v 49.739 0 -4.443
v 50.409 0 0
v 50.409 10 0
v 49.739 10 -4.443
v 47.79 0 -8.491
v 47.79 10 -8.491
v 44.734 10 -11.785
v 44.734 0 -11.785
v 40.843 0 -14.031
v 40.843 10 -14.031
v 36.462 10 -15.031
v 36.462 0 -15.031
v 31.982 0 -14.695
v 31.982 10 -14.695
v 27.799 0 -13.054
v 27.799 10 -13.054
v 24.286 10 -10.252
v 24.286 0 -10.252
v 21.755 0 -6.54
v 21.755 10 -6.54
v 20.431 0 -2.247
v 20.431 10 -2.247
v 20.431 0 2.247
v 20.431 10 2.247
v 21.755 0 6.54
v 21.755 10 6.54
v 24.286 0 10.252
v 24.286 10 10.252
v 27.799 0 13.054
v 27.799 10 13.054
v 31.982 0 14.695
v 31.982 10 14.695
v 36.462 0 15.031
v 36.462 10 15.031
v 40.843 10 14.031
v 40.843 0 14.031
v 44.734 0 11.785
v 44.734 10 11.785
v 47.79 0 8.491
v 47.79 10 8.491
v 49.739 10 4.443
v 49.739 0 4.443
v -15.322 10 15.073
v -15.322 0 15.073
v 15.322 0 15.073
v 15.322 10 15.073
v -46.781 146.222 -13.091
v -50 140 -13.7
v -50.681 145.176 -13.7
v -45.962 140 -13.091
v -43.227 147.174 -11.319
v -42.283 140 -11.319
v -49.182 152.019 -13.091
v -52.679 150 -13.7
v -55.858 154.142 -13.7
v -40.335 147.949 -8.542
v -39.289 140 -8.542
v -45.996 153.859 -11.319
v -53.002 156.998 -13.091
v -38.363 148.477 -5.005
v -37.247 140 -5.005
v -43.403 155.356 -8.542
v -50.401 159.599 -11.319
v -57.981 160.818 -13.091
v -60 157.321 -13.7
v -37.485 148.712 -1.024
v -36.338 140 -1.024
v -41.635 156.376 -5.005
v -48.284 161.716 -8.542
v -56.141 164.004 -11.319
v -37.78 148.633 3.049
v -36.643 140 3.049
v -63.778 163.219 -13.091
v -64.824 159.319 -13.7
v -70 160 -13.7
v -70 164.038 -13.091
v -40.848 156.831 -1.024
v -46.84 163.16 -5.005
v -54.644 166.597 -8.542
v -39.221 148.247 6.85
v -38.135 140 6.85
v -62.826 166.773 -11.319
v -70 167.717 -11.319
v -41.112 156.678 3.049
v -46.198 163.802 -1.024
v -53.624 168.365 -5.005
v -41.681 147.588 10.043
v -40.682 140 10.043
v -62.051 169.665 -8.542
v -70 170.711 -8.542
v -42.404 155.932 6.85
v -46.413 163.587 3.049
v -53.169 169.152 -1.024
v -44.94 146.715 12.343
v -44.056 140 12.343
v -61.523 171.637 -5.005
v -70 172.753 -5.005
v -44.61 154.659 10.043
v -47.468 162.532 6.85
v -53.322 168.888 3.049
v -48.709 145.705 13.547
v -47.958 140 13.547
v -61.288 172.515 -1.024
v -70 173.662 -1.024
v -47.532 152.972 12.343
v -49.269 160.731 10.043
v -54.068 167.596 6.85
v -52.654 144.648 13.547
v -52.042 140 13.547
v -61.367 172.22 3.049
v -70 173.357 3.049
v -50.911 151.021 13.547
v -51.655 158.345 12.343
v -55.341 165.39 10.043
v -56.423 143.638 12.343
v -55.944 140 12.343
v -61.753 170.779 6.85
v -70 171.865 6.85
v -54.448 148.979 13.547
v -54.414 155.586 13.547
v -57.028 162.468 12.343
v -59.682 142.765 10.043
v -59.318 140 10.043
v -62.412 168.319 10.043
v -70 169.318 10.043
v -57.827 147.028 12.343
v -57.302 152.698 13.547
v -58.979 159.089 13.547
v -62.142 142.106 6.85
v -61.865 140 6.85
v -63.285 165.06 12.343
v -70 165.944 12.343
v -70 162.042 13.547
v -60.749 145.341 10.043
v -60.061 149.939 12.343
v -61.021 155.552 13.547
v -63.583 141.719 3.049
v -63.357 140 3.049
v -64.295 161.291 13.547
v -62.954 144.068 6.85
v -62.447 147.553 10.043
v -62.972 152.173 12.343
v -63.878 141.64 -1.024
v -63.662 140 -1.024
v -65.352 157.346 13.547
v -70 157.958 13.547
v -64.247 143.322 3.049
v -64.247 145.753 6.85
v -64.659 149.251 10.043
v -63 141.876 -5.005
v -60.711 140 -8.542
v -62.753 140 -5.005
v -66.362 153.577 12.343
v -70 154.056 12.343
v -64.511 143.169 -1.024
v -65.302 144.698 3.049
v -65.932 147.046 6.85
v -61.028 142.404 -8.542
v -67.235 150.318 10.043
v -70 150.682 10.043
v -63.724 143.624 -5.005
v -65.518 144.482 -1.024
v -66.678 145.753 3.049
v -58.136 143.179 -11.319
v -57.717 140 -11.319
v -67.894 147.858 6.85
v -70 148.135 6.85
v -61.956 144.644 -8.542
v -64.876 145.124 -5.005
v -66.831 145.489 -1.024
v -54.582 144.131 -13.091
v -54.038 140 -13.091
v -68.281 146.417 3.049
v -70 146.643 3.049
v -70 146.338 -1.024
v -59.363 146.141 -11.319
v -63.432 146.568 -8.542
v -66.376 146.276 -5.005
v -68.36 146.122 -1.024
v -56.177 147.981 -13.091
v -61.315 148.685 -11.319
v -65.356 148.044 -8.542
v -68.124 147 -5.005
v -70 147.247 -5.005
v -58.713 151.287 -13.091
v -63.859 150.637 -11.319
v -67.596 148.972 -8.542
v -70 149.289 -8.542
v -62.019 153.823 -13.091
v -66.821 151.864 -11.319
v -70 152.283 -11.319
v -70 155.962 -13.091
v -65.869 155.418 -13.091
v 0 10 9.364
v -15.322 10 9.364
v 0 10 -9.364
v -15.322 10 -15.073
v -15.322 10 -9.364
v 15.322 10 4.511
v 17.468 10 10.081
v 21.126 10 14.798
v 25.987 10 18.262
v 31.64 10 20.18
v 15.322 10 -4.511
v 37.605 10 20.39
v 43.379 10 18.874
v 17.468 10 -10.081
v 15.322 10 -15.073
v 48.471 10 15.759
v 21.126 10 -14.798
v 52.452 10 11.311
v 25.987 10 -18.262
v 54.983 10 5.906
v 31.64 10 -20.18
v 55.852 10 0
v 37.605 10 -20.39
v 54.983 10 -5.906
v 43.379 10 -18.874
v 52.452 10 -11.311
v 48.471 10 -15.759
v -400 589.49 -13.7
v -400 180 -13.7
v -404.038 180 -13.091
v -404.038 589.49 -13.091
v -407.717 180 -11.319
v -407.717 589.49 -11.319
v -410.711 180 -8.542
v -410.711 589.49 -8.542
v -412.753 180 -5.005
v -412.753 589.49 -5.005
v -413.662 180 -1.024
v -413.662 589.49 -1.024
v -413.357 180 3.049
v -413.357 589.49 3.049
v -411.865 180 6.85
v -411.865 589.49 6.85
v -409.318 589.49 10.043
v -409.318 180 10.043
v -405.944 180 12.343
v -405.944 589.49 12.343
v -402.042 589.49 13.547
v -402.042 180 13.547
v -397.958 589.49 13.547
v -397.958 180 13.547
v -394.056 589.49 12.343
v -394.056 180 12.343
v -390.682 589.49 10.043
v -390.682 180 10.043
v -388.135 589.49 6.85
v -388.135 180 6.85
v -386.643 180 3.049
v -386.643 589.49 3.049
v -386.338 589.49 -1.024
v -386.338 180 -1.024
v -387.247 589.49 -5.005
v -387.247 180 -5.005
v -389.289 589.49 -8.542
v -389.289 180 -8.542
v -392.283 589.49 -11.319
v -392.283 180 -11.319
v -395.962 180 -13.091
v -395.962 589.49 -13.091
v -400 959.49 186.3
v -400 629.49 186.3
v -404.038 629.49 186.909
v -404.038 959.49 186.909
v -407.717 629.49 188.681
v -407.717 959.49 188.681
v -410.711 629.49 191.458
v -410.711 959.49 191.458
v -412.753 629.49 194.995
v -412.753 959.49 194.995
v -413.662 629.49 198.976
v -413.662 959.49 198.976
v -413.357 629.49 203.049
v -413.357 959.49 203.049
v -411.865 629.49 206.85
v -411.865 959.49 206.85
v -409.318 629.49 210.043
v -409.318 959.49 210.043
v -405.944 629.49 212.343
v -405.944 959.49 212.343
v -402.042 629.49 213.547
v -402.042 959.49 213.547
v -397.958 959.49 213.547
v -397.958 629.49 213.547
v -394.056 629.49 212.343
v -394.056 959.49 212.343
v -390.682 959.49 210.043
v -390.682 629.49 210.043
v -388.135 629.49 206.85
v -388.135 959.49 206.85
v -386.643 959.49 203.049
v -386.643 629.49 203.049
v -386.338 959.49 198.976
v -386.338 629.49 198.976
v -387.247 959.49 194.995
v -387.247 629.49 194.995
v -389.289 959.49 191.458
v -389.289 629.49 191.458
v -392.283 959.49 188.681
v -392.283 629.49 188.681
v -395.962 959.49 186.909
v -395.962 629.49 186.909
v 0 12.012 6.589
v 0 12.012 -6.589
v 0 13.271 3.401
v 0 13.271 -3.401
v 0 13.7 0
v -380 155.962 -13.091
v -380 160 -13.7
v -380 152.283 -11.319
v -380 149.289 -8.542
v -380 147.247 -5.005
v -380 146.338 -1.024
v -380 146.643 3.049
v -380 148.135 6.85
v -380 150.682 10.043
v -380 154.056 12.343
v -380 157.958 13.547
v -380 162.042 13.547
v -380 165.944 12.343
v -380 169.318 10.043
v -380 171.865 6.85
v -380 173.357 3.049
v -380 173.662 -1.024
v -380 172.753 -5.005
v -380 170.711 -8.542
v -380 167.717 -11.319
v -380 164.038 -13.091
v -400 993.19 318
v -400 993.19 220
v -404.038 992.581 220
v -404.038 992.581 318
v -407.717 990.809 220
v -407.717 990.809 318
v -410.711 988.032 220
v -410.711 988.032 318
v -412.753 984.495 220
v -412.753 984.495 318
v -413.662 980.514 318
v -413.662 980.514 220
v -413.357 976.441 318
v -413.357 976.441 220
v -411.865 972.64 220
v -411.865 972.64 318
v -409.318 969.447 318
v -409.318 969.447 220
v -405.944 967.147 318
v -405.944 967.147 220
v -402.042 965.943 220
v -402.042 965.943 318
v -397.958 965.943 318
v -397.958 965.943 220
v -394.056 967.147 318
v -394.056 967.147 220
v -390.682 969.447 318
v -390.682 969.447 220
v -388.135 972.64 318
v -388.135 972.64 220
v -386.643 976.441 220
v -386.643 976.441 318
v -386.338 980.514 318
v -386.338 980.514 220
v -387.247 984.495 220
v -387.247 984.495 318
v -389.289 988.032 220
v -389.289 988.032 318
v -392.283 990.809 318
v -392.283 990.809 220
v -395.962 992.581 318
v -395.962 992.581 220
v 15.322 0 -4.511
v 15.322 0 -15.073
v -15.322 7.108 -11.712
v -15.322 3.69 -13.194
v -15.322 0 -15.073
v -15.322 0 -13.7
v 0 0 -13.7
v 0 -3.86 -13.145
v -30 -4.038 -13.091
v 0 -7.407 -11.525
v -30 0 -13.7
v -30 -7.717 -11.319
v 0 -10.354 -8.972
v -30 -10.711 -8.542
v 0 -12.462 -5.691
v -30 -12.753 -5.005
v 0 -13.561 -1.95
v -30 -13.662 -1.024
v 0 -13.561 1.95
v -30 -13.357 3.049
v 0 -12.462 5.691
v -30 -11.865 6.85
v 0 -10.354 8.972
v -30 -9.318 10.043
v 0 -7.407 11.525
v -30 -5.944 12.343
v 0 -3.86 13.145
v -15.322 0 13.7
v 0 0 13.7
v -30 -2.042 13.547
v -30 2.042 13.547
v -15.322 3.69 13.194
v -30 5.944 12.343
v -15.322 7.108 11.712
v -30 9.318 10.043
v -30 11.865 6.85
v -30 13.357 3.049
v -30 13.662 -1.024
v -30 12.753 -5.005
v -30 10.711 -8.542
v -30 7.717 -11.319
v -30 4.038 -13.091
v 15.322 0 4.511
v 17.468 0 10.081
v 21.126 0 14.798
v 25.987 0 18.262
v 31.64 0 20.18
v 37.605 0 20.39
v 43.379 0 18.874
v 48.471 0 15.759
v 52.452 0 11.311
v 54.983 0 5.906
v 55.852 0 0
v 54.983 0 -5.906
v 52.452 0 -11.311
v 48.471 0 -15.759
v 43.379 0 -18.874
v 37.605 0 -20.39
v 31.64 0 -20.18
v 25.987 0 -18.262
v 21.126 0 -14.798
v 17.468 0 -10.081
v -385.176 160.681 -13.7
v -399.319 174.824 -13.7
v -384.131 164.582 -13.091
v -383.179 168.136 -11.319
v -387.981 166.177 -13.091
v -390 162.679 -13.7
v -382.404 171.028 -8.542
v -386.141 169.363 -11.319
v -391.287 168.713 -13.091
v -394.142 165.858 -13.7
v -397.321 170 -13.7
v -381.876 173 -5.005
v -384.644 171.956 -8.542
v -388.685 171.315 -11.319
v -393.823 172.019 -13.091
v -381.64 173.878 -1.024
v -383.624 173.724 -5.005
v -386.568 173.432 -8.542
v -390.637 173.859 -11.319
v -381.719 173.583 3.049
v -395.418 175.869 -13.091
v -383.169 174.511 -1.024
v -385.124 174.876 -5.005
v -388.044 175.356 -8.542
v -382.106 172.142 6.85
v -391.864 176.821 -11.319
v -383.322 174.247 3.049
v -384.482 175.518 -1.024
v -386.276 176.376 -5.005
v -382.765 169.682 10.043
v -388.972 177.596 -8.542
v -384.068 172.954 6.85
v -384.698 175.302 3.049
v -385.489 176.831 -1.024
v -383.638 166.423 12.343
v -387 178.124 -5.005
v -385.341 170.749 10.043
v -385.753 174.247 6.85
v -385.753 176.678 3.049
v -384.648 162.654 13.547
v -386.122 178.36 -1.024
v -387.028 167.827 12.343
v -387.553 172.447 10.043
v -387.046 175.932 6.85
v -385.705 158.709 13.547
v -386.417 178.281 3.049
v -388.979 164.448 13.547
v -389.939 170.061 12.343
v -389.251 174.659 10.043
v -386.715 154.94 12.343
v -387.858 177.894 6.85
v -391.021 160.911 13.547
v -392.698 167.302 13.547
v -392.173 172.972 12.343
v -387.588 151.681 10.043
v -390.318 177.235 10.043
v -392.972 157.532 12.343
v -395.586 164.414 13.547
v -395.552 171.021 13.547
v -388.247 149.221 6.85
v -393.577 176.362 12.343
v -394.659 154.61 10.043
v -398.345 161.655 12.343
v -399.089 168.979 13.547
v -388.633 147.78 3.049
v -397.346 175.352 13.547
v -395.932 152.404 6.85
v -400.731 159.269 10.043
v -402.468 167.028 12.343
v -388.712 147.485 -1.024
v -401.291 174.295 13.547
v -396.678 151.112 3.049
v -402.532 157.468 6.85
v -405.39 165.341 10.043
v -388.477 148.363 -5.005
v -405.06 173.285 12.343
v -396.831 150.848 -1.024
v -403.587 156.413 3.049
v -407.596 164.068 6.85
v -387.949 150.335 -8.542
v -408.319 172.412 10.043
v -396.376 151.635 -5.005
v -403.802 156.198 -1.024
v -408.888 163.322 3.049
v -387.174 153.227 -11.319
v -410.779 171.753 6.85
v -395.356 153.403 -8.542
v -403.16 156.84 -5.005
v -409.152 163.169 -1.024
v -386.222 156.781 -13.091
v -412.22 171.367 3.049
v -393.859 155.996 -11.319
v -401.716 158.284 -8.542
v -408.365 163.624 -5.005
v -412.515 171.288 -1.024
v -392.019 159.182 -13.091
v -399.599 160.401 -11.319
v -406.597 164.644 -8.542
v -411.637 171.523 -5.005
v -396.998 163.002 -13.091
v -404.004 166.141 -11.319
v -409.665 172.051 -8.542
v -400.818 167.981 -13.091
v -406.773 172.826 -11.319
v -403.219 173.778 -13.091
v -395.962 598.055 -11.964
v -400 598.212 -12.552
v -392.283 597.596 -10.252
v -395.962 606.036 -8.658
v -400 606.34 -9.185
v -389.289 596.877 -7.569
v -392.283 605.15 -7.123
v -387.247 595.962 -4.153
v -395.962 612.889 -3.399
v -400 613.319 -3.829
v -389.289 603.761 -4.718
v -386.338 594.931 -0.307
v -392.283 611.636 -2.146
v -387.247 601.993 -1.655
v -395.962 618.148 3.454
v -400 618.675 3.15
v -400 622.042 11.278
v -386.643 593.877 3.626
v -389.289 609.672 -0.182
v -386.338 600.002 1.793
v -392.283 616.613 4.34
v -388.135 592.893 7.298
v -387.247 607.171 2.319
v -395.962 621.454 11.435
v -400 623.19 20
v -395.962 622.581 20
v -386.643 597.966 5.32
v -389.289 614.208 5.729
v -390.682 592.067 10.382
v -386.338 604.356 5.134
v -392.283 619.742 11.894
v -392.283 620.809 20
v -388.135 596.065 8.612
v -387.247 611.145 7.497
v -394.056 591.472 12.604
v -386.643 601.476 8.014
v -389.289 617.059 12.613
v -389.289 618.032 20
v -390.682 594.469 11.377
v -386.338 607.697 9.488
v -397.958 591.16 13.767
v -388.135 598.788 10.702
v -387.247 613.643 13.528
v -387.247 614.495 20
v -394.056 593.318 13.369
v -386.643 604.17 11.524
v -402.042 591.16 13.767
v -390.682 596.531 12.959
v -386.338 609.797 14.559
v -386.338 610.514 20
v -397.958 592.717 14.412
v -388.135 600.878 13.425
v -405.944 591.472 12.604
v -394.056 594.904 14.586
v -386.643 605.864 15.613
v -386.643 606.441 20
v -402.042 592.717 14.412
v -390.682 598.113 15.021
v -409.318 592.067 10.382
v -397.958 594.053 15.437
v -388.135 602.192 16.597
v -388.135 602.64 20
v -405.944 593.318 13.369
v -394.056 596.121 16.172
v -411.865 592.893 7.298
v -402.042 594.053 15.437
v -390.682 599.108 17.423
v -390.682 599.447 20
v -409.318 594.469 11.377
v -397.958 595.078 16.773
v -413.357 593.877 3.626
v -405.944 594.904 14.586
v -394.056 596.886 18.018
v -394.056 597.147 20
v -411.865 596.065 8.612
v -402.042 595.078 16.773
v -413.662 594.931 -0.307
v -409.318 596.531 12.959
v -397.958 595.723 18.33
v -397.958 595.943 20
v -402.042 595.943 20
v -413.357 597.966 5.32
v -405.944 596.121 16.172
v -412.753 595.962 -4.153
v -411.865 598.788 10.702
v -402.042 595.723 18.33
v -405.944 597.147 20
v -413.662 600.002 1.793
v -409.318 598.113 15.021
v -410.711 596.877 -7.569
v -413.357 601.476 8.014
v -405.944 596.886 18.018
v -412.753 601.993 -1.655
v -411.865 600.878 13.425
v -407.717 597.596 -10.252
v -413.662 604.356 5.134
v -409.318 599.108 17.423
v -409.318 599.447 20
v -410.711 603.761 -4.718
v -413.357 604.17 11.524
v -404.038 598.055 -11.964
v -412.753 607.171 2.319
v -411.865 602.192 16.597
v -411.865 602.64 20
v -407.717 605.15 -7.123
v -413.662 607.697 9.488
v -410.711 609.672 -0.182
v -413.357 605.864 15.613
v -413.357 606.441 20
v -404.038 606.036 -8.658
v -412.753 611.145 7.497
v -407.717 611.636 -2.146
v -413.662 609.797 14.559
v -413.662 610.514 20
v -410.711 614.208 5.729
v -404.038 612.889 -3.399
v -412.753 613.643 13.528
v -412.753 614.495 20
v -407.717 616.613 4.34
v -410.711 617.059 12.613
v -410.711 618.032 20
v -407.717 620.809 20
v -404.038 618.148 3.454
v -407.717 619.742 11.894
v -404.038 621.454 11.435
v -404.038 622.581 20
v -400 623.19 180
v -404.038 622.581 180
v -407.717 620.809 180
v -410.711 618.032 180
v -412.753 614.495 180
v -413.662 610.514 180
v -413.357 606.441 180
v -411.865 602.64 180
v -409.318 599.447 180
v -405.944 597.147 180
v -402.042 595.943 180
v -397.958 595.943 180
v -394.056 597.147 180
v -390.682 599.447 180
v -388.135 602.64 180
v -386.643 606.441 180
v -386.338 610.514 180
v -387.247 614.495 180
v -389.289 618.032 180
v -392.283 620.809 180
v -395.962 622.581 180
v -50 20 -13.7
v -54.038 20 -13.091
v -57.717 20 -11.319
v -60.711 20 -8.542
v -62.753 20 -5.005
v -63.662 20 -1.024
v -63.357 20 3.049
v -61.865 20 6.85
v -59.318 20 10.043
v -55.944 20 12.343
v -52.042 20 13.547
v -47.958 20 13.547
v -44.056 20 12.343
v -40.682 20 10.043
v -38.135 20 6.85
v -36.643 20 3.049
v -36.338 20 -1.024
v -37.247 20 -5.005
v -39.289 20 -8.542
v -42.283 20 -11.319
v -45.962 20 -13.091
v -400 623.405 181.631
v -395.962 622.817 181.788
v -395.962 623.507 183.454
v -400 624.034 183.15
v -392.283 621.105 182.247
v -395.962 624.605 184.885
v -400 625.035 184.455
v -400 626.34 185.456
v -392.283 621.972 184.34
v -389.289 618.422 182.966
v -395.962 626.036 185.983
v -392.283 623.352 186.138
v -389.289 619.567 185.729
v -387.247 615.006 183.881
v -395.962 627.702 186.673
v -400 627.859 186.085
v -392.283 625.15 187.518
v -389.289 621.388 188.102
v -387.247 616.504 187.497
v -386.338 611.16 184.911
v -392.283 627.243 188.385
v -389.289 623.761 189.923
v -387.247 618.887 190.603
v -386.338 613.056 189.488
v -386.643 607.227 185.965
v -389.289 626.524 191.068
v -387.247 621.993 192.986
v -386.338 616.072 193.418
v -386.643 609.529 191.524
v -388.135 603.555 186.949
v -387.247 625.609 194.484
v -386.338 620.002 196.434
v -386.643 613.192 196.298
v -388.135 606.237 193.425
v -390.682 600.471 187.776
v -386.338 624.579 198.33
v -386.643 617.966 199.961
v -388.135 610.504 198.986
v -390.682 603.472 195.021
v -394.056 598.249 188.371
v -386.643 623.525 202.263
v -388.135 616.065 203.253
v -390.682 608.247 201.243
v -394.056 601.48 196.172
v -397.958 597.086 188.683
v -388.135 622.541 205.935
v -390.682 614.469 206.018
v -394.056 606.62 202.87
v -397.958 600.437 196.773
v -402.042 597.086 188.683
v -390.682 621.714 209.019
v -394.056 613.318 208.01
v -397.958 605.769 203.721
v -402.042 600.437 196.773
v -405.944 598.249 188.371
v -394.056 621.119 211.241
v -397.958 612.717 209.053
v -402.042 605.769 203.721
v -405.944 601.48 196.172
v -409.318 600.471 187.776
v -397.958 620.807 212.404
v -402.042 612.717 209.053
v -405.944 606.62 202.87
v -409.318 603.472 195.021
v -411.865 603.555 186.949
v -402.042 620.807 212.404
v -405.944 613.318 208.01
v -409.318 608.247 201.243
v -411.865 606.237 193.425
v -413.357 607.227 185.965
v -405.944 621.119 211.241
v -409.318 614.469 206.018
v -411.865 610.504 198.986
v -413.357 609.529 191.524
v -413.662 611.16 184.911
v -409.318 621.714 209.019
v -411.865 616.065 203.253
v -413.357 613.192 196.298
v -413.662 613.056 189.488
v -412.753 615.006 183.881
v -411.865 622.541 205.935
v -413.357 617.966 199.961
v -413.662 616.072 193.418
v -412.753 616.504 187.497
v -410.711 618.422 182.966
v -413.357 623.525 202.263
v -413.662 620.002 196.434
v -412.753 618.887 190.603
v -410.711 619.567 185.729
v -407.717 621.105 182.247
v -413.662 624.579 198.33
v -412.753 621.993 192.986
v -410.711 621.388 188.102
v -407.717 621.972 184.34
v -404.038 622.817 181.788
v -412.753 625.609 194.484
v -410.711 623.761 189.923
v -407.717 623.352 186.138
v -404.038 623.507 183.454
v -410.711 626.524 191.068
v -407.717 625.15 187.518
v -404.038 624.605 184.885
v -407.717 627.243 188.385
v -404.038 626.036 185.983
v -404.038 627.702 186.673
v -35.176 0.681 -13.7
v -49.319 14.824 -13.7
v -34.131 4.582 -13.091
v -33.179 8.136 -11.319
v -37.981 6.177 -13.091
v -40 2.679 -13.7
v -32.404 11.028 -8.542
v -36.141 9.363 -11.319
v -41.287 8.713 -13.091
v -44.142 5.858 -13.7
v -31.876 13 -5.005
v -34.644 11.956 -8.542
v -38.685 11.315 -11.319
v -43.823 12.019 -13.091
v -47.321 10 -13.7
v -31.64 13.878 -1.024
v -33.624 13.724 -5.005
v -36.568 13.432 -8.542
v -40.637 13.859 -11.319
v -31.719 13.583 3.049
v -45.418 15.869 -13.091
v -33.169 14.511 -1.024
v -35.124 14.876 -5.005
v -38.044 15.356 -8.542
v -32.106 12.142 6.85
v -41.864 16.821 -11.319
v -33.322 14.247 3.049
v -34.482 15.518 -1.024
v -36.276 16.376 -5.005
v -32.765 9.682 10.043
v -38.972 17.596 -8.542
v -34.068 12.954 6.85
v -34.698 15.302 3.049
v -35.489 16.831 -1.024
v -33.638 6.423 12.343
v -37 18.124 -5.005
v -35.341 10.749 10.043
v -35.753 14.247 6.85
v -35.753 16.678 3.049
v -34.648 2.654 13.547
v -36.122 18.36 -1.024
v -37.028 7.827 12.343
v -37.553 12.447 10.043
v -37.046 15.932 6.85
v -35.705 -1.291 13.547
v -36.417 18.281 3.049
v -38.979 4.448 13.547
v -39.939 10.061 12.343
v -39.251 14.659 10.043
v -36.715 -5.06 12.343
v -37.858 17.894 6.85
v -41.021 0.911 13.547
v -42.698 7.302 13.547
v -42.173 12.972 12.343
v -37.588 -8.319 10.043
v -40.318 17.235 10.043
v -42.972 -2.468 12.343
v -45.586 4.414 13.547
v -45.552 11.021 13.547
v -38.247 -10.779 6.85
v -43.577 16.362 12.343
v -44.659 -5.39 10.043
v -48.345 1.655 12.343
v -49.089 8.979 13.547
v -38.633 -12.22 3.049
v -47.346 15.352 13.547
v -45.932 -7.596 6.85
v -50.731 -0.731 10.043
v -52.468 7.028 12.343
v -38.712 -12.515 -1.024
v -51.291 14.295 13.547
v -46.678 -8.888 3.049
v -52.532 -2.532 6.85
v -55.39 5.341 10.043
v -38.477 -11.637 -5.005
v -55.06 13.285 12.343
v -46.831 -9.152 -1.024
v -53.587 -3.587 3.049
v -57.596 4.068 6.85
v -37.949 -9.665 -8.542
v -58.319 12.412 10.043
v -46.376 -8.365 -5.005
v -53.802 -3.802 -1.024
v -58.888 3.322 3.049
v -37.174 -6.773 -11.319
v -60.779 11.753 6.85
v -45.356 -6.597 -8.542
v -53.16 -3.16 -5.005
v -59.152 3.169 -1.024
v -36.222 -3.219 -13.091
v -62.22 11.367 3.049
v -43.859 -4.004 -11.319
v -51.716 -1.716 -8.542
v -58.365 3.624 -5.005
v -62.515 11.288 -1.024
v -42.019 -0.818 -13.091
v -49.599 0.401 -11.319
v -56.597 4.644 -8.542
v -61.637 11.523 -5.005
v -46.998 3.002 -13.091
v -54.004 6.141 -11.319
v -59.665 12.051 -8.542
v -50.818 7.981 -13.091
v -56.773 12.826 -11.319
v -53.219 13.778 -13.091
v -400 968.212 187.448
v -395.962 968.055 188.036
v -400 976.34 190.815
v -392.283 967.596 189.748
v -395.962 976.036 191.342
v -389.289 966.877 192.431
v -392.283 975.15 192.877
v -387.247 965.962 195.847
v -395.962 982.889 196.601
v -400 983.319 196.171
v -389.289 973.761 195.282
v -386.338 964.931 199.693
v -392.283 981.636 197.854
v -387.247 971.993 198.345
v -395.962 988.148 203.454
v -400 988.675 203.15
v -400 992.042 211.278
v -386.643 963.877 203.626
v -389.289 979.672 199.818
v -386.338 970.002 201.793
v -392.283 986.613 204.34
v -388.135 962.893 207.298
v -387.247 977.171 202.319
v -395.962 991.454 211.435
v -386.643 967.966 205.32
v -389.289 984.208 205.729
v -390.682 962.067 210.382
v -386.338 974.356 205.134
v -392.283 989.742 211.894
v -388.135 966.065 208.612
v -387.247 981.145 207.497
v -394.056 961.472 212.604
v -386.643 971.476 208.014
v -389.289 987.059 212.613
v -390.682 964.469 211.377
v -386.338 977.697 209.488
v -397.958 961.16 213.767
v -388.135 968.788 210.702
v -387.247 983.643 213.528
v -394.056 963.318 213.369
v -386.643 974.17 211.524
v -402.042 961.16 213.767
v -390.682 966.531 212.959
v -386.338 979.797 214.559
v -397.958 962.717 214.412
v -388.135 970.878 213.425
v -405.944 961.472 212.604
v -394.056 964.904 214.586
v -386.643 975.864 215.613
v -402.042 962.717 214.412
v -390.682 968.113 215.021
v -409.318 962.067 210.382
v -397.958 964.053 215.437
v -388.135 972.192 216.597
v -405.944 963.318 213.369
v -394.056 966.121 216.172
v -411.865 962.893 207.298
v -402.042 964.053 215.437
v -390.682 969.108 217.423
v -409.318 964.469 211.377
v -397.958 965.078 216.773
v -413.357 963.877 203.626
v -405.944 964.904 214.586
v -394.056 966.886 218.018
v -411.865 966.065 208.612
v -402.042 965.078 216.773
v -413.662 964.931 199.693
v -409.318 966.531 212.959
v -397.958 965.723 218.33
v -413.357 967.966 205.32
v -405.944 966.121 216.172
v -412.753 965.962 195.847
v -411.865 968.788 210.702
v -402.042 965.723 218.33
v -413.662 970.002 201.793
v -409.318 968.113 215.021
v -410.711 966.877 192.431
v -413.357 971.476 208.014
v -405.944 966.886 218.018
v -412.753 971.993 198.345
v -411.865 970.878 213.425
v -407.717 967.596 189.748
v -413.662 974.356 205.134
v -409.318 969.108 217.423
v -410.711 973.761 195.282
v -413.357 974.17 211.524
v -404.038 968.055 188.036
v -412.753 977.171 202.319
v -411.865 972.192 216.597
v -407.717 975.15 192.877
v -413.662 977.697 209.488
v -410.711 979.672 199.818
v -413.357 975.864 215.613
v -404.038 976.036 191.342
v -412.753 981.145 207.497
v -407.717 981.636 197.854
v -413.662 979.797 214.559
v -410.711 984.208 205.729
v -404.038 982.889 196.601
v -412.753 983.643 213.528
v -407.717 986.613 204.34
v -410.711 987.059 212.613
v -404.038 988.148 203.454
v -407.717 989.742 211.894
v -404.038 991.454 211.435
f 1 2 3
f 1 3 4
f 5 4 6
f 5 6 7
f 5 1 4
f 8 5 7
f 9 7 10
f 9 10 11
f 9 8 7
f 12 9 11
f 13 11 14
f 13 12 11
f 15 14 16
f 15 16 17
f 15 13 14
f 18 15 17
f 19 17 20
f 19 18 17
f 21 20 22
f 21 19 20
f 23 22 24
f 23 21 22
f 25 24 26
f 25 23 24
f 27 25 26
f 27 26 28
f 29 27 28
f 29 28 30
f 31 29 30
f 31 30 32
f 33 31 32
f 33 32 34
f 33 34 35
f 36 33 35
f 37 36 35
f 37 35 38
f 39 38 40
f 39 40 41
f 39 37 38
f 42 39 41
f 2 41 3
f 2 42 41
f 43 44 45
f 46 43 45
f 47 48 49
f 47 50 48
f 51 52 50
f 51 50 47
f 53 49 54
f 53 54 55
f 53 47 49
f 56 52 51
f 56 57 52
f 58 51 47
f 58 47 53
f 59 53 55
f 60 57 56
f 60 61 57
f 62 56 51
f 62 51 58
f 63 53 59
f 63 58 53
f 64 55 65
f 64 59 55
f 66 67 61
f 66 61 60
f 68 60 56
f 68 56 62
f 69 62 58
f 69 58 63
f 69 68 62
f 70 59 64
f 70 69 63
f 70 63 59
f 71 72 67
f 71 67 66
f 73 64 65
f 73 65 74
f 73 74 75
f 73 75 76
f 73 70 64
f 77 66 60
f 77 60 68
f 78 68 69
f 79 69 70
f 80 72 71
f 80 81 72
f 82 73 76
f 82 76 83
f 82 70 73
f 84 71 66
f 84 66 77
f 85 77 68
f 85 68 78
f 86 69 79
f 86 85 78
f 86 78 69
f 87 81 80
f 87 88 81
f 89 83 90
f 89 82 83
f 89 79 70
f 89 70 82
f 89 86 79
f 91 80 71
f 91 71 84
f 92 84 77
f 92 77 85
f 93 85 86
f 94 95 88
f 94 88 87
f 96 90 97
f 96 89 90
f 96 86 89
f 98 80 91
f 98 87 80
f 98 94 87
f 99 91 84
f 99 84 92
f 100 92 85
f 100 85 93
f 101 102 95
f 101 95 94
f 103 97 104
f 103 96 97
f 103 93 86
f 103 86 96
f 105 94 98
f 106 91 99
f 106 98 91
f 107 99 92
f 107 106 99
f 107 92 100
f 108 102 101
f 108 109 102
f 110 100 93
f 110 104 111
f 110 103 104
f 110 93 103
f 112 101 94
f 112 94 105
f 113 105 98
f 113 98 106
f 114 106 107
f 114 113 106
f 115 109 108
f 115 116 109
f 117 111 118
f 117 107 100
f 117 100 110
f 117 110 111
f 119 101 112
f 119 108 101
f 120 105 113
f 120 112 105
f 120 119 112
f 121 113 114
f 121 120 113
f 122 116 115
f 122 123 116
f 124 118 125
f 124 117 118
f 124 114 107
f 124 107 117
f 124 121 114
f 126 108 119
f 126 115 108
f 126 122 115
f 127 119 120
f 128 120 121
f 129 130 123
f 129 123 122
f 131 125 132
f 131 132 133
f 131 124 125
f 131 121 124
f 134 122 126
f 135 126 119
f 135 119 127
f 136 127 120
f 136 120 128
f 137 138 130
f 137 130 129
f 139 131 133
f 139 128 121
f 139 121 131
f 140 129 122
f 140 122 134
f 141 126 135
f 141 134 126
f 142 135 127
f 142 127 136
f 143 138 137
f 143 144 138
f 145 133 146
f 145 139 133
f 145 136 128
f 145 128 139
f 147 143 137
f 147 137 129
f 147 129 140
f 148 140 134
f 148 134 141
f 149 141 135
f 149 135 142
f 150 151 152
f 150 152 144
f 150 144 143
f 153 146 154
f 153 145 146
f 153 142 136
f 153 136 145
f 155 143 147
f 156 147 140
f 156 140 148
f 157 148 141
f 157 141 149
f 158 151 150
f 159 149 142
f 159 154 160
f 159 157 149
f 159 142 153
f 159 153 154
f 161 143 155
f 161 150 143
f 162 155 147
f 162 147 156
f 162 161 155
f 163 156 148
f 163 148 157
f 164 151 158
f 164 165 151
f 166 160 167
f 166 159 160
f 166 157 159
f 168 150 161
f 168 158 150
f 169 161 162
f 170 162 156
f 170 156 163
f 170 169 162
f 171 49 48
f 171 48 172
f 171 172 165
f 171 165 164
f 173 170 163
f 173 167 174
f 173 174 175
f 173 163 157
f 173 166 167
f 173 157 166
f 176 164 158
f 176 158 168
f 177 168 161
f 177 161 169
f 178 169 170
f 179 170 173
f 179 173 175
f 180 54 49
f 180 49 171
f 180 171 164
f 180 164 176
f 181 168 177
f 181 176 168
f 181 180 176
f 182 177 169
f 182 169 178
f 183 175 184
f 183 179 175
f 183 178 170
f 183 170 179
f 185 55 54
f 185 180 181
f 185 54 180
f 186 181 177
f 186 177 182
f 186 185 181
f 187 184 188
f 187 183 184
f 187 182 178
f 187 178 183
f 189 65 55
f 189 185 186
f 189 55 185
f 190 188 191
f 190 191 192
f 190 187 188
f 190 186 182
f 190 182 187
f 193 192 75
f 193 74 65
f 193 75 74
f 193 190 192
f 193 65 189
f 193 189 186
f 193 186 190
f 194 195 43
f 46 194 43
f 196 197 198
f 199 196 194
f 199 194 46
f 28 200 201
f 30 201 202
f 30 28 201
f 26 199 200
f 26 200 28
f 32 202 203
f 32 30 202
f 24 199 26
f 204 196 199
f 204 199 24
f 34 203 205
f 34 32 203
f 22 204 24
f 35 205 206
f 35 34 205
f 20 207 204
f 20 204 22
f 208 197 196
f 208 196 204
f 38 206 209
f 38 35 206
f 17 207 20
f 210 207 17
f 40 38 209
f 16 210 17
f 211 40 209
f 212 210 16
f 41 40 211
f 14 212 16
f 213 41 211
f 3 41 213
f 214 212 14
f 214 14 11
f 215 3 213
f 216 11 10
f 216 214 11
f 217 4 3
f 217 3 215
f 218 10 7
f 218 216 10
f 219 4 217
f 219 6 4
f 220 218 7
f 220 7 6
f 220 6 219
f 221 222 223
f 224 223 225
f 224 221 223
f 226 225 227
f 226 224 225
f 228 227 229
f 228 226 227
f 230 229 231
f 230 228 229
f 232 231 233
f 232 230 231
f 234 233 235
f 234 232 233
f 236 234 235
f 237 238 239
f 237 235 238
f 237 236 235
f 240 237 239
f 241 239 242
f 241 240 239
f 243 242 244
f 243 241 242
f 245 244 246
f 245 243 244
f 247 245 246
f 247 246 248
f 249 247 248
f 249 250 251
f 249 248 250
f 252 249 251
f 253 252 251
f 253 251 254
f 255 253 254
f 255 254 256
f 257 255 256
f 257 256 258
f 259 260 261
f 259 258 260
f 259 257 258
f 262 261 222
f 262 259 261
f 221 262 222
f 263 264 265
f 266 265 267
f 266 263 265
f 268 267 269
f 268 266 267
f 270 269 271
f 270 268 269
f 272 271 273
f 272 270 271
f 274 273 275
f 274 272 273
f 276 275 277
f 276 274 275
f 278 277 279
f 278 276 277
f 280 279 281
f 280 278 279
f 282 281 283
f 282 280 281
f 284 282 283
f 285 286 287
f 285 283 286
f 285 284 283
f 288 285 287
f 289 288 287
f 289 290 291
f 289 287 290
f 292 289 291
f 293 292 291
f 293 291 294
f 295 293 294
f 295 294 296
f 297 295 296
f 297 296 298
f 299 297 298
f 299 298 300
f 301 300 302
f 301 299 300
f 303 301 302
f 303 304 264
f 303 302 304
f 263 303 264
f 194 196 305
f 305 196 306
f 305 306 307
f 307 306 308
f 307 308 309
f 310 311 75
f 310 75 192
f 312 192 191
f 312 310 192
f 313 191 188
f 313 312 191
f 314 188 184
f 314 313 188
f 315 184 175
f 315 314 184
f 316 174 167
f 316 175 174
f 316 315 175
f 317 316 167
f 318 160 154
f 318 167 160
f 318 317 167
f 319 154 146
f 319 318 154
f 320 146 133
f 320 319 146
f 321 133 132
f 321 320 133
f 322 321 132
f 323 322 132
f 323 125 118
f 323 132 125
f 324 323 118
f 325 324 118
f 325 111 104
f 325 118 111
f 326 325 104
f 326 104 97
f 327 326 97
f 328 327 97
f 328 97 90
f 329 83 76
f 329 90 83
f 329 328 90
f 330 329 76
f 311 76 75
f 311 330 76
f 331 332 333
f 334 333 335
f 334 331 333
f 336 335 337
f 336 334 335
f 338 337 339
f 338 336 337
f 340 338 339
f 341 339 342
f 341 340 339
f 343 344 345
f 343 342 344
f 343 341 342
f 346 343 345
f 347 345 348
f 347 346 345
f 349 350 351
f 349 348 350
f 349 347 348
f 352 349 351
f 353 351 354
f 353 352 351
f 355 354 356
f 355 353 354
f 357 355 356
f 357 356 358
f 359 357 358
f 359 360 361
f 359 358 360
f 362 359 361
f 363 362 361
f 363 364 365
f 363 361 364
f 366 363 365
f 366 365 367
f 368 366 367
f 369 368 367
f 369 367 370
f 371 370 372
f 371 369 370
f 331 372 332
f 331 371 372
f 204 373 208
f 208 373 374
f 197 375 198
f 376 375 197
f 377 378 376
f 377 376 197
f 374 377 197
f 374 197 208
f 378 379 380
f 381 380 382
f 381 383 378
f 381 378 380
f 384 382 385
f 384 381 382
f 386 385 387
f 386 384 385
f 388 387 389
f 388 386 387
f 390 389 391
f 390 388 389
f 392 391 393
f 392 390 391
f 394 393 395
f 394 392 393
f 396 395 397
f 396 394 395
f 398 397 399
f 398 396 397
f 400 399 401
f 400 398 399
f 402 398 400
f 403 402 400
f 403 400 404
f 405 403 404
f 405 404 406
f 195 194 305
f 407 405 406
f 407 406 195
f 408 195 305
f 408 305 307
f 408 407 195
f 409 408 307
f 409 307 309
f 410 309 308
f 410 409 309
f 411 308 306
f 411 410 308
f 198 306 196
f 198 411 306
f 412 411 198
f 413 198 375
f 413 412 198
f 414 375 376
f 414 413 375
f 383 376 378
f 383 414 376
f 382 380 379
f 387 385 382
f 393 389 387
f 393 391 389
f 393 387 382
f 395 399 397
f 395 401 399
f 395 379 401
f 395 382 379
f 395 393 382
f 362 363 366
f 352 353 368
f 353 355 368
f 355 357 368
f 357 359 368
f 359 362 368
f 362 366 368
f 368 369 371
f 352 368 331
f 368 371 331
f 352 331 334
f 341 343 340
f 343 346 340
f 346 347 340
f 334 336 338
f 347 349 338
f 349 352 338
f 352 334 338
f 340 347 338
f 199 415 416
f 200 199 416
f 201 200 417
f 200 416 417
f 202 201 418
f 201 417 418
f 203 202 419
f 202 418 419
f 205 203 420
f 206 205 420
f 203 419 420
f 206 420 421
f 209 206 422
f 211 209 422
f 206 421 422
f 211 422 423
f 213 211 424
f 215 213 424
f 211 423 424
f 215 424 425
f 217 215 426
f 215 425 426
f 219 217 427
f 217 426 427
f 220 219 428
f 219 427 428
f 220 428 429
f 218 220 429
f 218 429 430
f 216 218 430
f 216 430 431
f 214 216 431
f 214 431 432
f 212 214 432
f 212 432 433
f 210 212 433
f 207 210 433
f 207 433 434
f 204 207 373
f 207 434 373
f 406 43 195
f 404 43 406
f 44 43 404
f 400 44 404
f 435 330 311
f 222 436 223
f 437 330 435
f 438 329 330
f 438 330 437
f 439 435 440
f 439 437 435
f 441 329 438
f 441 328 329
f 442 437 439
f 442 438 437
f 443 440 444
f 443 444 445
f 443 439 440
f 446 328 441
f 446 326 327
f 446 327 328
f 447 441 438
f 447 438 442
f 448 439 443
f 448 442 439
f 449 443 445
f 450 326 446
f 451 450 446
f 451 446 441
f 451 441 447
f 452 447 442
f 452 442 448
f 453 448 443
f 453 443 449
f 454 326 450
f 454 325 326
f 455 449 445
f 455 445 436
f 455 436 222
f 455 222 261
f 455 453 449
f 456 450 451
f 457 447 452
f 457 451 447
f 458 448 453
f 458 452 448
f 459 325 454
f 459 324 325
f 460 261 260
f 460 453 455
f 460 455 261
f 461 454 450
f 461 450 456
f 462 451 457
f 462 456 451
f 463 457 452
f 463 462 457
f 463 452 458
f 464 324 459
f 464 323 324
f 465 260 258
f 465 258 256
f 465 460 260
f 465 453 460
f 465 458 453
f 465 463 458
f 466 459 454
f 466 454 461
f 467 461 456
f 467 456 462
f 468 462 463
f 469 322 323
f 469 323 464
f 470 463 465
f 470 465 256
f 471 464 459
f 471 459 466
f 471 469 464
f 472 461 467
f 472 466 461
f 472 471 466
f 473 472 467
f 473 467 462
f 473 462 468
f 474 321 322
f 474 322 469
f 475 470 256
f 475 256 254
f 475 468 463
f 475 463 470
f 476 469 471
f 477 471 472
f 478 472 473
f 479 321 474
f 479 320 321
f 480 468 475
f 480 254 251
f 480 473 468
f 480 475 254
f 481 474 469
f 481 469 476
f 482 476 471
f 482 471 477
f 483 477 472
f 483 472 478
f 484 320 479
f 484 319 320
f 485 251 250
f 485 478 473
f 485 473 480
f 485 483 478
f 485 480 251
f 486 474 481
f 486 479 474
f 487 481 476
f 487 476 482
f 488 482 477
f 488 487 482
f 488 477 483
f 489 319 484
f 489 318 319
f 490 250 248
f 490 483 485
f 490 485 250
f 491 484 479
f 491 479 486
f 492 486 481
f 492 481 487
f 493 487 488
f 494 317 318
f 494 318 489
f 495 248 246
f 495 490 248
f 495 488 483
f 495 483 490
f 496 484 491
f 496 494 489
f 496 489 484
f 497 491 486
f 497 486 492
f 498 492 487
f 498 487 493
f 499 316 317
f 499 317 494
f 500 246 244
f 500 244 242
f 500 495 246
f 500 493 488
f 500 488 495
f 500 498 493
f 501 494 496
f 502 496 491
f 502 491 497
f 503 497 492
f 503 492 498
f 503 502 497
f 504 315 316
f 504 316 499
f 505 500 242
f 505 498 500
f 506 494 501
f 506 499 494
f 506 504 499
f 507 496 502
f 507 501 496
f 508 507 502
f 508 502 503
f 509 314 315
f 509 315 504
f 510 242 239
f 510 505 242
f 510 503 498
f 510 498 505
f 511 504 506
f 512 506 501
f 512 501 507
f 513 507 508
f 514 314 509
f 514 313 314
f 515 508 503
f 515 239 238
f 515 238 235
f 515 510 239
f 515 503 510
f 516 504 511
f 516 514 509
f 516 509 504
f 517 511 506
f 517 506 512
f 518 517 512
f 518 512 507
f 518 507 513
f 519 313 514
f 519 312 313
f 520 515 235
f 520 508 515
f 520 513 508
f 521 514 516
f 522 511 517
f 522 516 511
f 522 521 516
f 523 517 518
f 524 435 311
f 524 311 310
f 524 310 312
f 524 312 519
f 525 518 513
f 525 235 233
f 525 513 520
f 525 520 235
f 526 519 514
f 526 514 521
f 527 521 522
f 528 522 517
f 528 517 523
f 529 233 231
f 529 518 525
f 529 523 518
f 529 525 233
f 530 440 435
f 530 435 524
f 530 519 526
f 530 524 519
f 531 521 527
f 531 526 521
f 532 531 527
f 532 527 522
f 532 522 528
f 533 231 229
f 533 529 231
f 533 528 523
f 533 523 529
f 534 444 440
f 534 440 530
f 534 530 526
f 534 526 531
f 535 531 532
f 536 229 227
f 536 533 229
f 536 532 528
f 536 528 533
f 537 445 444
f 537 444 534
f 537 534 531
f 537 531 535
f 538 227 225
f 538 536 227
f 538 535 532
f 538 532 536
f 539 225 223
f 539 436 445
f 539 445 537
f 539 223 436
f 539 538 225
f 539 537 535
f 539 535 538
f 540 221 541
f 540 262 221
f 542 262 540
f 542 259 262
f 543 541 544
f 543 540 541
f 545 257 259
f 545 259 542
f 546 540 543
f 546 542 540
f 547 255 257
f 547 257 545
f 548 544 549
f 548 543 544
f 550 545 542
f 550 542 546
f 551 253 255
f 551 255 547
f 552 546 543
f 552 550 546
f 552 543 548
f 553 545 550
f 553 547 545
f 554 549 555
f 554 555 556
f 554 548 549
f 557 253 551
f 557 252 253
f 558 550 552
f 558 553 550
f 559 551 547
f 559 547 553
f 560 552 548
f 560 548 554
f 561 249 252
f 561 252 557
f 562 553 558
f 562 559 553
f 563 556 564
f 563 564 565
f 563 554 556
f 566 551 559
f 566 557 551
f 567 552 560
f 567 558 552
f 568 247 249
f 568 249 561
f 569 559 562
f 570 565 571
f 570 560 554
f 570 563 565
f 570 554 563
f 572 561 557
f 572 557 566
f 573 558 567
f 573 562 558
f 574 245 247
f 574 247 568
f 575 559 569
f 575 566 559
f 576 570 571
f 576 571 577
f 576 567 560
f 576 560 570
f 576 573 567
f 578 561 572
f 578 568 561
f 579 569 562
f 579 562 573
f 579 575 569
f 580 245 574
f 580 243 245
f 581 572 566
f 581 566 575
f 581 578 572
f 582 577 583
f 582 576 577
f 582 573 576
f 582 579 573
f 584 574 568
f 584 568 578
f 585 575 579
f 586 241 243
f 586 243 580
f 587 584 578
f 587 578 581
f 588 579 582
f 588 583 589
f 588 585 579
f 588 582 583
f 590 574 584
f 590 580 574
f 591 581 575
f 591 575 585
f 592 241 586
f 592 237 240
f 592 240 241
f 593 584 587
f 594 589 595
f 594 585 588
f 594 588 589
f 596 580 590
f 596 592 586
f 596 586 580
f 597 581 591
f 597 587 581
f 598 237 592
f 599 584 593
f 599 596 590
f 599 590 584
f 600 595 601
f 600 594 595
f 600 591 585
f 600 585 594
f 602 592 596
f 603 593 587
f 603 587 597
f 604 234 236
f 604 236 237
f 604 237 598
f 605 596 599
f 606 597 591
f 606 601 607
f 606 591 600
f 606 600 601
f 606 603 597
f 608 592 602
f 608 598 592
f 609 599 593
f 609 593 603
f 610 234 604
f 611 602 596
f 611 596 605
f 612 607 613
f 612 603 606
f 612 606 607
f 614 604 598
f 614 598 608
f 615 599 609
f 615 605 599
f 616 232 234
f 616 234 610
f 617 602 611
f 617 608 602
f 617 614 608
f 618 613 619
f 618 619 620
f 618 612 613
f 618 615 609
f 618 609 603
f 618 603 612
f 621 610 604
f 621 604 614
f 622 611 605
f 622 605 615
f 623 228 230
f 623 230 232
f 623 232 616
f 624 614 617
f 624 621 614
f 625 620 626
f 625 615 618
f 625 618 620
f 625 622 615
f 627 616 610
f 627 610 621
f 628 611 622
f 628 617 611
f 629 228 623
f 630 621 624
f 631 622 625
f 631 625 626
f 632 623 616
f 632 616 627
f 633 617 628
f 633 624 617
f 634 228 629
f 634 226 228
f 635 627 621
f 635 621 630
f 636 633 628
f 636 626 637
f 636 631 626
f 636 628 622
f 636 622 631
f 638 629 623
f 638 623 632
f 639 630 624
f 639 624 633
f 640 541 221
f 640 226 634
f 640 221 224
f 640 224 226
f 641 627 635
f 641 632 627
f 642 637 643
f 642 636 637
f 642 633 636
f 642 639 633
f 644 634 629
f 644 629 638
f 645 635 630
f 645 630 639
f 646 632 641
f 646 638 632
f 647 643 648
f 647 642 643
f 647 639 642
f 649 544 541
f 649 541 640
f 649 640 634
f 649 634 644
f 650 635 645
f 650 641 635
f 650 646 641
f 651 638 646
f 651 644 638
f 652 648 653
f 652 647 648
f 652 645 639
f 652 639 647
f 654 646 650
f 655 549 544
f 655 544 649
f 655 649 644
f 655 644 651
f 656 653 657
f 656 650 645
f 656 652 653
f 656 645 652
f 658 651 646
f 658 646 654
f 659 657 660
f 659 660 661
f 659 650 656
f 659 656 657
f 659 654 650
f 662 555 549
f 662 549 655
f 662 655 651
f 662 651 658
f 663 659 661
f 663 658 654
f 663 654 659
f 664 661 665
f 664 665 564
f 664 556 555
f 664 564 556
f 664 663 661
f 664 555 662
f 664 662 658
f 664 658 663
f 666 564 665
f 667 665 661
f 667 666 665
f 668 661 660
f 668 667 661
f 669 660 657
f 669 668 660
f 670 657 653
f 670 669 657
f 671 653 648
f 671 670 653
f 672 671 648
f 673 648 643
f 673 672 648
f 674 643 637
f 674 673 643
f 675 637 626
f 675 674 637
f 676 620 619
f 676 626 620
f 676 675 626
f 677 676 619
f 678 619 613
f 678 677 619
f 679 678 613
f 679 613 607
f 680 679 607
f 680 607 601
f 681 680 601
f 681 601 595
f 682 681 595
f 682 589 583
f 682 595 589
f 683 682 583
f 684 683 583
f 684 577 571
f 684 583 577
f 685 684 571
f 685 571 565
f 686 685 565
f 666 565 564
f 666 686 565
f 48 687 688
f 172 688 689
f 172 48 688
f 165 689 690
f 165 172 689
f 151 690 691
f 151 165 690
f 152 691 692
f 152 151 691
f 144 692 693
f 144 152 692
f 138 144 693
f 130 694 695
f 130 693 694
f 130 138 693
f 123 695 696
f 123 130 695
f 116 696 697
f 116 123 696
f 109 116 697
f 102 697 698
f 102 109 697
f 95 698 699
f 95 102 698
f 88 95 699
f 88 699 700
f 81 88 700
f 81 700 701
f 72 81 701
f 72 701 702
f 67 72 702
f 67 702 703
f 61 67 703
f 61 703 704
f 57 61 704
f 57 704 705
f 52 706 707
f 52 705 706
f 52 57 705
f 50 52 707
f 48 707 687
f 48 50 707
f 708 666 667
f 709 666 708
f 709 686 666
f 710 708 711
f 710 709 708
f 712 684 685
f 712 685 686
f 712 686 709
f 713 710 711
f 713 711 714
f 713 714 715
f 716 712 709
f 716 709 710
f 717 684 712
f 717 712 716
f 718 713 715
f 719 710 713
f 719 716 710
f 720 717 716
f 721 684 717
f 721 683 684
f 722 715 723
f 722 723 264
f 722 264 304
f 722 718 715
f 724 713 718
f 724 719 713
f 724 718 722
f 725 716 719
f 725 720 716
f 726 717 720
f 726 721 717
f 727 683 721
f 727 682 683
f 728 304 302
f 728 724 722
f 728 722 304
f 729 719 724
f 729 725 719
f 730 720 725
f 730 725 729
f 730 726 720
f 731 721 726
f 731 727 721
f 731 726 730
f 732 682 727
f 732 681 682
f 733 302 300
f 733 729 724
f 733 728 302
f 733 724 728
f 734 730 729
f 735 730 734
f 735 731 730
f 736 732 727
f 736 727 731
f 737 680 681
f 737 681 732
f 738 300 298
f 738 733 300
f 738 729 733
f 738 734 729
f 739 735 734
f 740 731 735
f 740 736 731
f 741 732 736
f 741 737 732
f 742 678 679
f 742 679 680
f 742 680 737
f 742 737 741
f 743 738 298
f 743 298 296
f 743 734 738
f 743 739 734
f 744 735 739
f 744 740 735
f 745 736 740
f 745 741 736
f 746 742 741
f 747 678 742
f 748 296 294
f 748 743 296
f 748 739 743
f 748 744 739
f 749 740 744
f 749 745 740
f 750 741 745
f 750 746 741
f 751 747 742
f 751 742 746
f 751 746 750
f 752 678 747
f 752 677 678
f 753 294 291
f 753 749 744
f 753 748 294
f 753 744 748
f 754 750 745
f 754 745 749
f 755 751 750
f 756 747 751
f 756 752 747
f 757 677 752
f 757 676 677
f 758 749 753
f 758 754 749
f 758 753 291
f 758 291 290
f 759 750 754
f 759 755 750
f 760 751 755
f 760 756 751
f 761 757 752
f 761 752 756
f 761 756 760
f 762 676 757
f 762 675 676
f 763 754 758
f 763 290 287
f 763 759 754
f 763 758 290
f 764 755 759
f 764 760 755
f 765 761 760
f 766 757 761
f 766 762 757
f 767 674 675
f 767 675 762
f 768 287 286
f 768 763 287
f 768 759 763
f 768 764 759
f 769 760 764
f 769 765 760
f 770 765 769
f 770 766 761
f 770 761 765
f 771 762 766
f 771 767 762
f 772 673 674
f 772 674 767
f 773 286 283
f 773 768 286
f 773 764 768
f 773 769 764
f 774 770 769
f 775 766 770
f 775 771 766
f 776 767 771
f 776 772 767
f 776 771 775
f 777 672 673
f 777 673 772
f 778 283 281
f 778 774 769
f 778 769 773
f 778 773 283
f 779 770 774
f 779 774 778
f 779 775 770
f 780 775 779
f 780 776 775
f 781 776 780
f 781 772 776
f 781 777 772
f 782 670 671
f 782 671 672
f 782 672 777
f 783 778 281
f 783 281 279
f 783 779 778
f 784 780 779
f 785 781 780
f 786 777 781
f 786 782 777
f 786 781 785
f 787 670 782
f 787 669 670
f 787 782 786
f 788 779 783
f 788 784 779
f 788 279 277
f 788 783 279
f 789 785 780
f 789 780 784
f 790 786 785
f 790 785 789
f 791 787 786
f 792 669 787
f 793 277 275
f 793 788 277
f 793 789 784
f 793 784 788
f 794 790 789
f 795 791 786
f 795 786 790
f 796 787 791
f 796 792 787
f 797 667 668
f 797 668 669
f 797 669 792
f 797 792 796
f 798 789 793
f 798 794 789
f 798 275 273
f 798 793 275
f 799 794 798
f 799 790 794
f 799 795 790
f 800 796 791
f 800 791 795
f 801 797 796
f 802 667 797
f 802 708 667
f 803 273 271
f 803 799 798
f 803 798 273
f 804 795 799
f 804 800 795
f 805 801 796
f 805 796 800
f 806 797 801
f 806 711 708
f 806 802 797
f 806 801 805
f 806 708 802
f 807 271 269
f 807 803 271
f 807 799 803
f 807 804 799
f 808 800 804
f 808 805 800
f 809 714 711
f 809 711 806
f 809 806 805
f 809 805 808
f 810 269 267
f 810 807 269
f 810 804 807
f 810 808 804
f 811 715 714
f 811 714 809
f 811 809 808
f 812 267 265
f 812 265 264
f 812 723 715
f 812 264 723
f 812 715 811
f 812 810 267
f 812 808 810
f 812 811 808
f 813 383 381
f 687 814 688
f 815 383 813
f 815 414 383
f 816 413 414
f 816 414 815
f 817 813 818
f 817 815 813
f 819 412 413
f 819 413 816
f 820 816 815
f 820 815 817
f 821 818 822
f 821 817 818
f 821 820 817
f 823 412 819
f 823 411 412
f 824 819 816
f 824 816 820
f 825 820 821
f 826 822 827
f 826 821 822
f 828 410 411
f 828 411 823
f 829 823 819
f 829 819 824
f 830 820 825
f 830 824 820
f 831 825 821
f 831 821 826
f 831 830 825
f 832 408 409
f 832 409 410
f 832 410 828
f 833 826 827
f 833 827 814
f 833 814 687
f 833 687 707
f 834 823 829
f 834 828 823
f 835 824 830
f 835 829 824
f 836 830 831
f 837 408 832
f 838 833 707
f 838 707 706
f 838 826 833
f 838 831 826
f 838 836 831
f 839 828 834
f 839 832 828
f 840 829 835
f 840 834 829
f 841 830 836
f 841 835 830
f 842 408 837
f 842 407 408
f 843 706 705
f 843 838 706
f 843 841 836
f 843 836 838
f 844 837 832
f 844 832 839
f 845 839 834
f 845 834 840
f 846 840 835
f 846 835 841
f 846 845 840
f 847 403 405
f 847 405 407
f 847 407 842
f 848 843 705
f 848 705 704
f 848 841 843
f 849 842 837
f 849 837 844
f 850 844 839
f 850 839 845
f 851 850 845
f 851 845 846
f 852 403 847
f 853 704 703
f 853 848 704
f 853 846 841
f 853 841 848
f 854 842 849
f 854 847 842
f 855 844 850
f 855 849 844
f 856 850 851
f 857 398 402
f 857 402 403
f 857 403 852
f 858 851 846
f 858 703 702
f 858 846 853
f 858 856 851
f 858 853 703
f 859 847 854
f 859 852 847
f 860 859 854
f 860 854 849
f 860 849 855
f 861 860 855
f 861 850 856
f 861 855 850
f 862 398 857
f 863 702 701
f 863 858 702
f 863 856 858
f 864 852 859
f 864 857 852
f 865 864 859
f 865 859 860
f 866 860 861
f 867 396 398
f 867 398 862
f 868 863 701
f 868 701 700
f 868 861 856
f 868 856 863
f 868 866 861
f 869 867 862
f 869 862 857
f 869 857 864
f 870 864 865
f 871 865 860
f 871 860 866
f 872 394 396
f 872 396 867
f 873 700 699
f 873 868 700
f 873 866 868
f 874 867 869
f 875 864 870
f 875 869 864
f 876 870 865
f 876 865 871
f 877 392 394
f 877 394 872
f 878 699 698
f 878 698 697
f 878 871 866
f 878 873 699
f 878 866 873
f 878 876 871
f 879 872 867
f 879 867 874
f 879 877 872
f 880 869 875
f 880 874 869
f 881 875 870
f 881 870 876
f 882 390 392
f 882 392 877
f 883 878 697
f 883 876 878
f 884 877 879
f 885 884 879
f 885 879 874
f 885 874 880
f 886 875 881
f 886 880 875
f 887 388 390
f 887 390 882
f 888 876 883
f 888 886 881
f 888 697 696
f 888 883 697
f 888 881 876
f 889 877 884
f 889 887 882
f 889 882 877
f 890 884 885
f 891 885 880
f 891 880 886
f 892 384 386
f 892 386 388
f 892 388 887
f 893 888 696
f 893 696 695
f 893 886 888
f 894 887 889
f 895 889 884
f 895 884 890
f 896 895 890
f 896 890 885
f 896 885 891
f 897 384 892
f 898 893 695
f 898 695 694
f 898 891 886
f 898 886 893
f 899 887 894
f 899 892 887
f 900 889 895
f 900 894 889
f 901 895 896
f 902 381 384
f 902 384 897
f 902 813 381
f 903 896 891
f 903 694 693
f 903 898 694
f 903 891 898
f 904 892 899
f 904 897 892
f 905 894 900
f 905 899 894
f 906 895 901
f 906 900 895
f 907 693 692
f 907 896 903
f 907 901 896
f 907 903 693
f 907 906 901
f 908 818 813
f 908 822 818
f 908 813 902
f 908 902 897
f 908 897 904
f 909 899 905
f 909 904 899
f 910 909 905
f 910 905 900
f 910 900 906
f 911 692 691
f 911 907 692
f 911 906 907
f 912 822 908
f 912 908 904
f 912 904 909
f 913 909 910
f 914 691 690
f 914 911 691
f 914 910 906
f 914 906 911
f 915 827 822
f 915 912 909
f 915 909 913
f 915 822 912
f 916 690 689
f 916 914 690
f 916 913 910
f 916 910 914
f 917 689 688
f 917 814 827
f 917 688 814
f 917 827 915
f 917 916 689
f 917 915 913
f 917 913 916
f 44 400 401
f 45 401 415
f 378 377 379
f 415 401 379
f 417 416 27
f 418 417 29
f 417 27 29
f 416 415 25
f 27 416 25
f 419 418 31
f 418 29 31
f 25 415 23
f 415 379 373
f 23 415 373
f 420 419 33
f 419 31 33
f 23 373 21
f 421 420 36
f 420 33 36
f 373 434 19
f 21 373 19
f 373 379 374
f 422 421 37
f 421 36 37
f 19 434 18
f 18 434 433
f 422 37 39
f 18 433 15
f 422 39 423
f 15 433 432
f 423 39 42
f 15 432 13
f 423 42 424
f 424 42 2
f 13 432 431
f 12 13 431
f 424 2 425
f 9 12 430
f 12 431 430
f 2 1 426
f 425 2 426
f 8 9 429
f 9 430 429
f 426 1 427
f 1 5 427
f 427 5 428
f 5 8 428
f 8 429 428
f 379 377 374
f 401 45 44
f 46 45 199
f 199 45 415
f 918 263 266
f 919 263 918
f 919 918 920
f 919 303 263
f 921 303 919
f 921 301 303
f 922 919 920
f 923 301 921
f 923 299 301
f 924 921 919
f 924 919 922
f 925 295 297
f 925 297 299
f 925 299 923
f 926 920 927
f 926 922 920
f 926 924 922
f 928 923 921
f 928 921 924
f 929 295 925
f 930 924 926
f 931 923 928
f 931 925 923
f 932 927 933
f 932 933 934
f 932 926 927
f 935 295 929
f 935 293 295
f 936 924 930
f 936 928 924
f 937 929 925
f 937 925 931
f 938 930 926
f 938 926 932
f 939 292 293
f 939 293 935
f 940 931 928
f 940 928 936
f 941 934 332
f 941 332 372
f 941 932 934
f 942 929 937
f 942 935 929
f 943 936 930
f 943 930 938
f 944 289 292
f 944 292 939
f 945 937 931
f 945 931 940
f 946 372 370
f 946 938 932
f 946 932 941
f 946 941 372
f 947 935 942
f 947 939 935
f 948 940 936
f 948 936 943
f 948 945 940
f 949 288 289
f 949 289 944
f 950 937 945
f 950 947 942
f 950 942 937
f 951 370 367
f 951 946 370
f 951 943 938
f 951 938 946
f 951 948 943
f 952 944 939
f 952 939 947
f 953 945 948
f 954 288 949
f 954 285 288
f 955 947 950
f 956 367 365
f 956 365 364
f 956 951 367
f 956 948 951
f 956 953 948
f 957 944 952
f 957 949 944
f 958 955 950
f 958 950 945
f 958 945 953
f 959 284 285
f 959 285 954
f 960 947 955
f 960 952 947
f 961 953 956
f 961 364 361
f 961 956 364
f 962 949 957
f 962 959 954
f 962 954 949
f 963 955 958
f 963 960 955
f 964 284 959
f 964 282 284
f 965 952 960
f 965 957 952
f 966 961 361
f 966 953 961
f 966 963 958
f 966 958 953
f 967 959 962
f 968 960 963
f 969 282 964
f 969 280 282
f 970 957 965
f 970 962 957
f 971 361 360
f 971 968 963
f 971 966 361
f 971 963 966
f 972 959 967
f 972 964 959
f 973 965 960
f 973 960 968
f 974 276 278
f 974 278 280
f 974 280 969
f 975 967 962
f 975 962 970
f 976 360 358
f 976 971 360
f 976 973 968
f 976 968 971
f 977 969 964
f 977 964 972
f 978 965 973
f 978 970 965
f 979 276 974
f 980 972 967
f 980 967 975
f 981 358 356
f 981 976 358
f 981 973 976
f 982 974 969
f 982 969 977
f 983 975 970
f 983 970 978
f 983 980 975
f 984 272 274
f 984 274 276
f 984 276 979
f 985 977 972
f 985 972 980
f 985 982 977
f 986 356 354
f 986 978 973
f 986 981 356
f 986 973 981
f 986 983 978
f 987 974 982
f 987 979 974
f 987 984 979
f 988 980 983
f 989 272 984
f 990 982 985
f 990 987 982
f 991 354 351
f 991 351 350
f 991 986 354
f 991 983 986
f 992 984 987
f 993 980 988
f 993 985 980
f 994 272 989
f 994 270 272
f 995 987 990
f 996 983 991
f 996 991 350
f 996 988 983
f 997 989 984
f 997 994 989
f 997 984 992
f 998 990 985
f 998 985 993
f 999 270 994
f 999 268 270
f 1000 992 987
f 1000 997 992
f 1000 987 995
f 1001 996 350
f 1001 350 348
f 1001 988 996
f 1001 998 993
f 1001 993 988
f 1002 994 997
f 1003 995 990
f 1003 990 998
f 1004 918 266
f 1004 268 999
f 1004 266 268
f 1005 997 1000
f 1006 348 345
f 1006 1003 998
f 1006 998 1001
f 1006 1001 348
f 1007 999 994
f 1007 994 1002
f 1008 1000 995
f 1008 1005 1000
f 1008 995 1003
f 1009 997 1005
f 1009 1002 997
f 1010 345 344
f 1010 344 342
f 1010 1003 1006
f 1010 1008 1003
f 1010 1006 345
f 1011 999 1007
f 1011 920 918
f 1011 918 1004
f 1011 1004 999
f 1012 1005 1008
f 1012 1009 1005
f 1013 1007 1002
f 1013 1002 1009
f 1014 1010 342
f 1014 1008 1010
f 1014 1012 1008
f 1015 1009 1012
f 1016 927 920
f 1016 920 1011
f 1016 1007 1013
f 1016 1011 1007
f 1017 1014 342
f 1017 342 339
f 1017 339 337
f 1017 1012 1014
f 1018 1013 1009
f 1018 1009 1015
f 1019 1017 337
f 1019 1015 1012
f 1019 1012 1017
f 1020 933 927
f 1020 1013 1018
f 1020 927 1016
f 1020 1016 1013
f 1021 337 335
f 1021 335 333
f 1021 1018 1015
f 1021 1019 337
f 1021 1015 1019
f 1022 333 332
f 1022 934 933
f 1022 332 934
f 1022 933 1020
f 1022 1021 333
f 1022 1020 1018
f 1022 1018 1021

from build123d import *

# Parameters (mm, degrees)
CROQUIS1_R              = 13.7
CROQUIS2_R              = 20.515824583
CROQUIS2_R_2            = 15.073303007
CROQUIS2_W              = 30.644249184
CROQUIS2_H              = 30.146606014
SALIENTE_EXTRUIR1_DEPTH = 10


with BuildPart() as part:
    # Barrer1: sweep along a curve in space
    with BuildLine() as barrer1_path:
        Line((0, 0, 0), (-30, 0, 0))
        ThreePointArc((-30, 0, 0), (-44.142135624, 5.857864376, 0), (-50, 20, 0))
        Line((-50, 20, 0), (-50, 140, 0))
        ThreePointArc((-50, 140, 0), (-55.857864376, 154.142135624, 0), (-70, 160, 0))
        Line((-70, 160, 0), (-380, 160, 0))
        ThreePointArc((-380, 160, 0), (-394.142135624, 165.857864376, 0), (-400, 180, 0))
        Line((-400, 180, 0), (-400, 589.49, 0))
        ThreePointArc((-400, 589.49, 0), (-400, 603.632135624, 5.857864376), (-400, 609.49, 20))
        Line((-400, 609.49, 20), (-400, 609.49, 180))
        ThreePointArc((-400, 609.49, 180), (-400, 615.347864376, 194.142135624), (-400, 629.49, 200))
        Line((-400, 629.49, 200), (-400, 959.49, 200))
        ThreePointArc((-400, 959.49, 200), (-400, 973.632135624, 205.857864376), (-400, 979.49, 220))
        Line((-400, 979.49, 220), (-400, 979.49, 318))
    # Croquis1 → Barrer1 (sweep)
    with BuildSketch(Plane(origin=(0, 0, 0), x_dir=(0, 0, -1), z_dir=(1, 0, 0))):
        Circle(CROQUIS1_R)
    sweep(path=barrer1_path.line)

    # Croquis2 → Saliente-Extruir1 (add)
    with BuildSketch(Plane(origin=(0, 0, 0), x_dir=(1, 0, 0), z_dir=(0, 1, 0))):
        with Locations((35.335783032, 0)):
            Circle(CROQUIS2_R)
        with Locations((35.335783032, 0)):
            Circle(CROQUIS2_R_2, mode=Mode.SUBTRACT)
        Rectangle(CROQUIS2_W, CROQUIS2_H)
    extrude(amount=SALIENTE_EXTRUIR1_DEPTH)


solid = part.part
